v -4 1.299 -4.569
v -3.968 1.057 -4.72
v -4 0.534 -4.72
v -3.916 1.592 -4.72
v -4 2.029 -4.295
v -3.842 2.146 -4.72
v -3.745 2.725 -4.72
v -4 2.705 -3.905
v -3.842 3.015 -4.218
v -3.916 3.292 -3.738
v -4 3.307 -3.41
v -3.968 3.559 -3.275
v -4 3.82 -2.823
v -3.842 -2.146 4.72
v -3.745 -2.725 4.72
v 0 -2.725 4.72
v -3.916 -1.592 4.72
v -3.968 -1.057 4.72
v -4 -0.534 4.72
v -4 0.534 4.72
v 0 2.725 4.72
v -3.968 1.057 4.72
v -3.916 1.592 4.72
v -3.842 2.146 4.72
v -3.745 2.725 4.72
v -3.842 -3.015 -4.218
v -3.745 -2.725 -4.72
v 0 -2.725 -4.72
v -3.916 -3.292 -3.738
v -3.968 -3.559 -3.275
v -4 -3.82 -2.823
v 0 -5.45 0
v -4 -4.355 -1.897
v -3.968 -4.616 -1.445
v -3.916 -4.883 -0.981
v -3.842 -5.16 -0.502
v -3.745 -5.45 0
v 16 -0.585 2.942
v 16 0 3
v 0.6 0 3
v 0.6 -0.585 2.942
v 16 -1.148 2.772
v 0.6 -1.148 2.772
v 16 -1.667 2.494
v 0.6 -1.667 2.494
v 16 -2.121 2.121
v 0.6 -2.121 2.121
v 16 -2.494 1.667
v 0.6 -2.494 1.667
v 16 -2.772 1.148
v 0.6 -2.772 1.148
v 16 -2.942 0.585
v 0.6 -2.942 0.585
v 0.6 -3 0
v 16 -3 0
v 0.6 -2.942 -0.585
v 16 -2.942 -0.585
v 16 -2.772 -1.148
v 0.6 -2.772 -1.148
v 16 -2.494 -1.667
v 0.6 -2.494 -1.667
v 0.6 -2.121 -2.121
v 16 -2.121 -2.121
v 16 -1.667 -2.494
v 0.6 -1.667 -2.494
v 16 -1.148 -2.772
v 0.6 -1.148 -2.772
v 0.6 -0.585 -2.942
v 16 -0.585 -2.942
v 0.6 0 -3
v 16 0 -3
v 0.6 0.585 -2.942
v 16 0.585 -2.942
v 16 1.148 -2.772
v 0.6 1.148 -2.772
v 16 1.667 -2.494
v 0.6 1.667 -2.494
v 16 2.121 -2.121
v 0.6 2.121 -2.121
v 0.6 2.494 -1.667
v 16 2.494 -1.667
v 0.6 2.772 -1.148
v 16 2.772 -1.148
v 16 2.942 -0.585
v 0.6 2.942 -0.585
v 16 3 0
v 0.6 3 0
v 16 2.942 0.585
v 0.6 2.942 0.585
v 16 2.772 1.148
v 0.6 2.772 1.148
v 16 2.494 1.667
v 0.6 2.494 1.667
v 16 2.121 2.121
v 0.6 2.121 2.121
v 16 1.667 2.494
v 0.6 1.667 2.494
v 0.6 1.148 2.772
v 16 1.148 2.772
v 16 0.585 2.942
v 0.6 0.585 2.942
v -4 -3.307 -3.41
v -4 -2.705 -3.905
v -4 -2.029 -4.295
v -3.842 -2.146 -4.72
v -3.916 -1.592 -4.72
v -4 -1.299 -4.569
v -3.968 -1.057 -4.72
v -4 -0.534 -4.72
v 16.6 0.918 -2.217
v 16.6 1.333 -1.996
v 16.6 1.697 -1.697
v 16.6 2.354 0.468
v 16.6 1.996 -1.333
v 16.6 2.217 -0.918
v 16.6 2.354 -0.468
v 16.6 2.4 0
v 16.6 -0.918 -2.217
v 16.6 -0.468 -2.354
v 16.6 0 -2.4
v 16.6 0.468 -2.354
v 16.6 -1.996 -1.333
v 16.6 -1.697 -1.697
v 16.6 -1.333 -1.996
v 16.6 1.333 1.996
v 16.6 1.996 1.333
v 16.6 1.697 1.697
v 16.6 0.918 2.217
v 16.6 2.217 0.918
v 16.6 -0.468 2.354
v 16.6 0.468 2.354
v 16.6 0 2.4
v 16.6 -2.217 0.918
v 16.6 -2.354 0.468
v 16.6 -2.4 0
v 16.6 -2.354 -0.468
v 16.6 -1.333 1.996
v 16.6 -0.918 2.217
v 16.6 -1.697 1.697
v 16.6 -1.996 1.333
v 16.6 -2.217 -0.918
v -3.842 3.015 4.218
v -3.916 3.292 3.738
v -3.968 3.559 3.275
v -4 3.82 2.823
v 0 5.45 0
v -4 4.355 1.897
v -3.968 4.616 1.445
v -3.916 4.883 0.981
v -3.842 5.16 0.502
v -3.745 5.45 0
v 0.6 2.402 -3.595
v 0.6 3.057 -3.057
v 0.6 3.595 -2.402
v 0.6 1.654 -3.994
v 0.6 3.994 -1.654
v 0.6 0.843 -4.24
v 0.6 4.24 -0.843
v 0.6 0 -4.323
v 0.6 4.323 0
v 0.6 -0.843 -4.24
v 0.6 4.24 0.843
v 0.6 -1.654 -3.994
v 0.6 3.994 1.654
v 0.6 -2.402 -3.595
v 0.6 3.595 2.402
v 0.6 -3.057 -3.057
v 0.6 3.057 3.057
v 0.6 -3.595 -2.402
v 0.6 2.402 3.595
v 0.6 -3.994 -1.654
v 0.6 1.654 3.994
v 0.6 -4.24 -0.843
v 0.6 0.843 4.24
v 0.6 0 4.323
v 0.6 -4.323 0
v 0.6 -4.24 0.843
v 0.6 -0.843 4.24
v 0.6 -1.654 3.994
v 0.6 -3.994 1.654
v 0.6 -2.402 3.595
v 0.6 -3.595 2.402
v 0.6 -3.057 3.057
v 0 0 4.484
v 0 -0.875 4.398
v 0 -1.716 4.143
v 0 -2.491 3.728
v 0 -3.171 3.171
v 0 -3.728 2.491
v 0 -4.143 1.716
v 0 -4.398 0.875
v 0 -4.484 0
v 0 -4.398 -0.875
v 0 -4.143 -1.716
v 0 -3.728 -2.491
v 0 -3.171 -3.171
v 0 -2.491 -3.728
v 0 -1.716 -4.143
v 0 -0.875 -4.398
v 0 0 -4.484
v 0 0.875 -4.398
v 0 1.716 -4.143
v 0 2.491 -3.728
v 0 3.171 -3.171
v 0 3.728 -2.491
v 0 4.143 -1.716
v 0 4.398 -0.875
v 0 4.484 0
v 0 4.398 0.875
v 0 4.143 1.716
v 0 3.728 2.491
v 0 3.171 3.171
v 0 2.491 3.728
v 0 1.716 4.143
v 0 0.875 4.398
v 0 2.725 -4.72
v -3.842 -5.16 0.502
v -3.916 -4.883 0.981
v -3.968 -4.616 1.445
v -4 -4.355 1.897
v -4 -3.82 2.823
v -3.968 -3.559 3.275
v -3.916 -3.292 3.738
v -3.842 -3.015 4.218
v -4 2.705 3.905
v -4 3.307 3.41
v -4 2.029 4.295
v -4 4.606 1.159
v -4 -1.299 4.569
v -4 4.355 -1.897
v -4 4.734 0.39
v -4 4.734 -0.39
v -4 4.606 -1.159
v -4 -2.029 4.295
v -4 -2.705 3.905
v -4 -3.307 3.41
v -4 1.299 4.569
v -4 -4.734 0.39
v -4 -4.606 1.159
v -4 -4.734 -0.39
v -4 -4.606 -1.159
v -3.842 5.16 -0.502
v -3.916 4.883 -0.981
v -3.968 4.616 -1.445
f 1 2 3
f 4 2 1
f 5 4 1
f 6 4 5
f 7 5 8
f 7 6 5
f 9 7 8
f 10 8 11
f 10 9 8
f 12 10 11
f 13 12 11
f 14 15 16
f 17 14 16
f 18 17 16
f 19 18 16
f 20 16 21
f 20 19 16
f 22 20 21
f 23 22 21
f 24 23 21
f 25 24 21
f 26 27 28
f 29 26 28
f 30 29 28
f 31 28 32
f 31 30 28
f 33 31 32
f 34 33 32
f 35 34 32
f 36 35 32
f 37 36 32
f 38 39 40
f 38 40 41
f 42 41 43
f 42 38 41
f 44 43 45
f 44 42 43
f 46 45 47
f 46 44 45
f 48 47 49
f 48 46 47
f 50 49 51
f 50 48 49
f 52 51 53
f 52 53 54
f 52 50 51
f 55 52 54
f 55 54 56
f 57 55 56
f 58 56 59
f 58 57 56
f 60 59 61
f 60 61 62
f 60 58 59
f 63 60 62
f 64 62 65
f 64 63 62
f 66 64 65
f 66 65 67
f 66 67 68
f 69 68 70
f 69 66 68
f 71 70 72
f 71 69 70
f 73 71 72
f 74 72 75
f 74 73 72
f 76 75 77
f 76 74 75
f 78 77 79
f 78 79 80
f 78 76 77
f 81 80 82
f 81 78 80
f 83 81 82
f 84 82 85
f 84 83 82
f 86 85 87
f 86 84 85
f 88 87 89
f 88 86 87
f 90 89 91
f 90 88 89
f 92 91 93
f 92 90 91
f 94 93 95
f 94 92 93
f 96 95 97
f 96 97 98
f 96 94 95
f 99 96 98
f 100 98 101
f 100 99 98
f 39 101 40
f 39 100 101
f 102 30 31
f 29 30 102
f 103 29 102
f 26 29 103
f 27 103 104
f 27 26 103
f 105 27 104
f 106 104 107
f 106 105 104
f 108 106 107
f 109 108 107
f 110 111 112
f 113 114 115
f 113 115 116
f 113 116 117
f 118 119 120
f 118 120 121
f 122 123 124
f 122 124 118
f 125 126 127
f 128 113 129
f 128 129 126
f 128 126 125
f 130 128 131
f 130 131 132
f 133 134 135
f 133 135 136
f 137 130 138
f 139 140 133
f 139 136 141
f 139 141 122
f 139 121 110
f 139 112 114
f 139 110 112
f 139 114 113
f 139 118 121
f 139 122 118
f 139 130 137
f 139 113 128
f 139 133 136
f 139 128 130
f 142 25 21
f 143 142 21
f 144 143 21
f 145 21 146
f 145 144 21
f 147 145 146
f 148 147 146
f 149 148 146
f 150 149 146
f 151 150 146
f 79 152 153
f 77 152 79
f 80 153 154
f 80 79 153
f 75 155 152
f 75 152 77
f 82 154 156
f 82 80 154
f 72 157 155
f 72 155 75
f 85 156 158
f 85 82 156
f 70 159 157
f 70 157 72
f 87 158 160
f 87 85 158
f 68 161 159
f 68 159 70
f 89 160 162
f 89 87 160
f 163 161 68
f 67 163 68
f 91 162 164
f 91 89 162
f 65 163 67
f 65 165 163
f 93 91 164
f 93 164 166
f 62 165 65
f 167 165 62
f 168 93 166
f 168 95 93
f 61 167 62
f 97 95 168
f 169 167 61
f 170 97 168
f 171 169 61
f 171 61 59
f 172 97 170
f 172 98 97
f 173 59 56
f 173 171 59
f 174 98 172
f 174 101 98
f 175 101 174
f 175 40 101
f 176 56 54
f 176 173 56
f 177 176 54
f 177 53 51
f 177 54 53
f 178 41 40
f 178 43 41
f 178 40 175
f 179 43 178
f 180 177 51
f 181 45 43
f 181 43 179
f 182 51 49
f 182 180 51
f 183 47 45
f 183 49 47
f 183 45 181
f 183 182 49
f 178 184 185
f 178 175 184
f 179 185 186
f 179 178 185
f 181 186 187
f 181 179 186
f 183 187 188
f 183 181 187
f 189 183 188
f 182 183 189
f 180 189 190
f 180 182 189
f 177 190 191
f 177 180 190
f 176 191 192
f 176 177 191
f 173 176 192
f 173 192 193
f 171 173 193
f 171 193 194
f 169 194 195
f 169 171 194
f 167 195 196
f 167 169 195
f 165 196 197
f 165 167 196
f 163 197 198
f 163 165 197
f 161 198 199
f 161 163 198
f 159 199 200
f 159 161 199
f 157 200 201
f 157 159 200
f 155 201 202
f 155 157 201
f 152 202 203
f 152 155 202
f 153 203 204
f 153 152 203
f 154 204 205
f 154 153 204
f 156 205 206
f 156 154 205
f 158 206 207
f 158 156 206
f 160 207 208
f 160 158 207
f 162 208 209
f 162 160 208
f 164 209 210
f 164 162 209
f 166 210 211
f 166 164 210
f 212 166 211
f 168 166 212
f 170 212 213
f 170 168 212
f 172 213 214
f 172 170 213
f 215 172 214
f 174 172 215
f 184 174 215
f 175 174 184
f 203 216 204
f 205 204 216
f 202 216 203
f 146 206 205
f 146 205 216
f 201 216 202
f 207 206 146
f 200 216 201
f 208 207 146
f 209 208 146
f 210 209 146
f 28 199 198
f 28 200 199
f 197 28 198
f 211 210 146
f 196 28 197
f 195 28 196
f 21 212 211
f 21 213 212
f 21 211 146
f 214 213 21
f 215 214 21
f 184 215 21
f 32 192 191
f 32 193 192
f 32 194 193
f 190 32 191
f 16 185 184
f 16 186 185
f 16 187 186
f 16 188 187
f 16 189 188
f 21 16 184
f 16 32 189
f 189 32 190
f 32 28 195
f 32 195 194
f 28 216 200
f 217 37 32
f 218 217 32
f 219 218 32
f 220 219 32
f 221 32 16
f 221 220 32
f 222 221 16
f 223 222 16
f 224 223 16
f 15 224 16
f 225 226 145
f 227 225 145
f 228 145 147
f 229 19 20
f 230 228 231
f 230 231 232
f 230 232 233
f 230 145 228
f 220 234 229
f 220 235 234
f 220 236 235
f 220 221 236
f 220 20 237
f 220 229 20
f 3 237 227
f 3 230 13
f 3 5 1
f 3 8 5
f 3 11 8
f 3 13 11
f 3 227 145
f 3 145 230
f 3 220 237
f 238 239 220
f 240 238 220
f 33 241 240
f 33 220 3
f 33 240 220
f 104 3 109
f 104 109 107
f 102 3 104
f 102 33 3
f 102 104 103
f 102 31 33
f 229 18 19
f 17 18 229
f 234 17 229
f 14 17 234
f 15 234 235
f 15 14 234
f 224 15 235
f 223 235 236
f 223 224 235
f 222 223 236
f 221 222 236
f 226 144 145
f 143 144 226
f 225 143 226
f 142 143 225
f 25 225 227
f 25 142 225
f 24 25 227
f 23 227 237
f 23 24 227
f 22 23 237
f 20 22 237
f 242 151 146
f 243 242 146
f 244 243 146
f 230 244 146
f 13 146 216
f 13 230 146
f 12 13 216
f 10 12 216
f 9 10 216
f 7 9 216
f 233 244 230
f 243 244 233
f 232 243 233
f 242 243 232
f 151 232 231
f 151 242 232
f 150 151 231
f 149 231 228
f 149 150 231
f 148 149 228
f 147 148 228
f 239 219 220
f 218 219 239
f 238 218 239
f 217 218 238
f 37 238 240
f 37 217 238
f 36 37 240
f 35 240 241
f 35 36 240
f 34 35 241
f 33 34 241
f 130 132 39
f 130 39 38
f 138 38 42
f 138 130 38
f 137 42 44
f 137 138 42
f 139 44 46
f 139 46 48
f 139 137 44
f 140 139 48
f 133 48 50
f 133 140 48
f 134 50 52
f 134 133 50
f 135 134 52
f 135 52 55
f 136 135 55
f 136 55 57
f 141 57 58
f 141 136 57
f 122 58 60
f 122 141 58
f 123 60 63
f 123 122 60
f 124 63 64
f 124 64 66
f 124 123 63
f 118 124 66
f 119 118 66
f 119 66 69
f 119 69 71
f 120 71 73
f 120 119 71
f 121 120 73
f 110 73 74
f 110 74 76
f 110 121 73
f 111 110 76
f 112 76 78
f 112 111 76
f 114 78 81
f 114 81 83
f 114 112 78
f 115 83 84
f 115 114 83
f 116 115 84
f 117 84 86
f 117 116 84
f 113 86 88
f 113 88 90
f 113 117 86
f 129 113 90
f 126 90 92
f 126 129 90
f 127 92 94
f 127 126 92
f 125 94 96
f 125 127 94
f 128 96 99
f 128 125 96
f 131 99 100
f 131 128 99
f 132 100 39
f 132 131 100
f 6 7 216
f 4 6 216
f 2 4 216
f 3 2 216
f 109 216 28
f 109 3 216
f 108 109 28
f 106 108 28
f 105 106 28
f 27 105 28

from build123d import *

# Parameters (mm, degrees)
SKETCH_2_OUTSIDE_W  = 18.046
SKETCH_2_OUTSIDE_H  = 18.046
CUT_EXTRUDE_1_DEPTH = 22.994658442
CHAMFER_1_SIZE      = 0.6


with BuildPart() as part:
    # Эскиз1 → Повернуть1 (revolve)
    with BuildSketch(Plane.XY, mode=Mode.PRIVATE) as revolve_1_sk:
        Polygon((-4, 0), (-4, 5.45), (0, 5.45), (0, 4.483974596), (0.6, 4.323205081), (0.6, 3), (16.6, 3), (16.6, 0), align=None)
    revolve(revolve_1_sk.sketch.rotate(Axis((-1000, 0, 0), (1, 0, 0)), 90), axis=Axis((-1000, 0, 0), (1, 0, 0)))

    # Эскиз2 outside → Вырез-Вытянуть1 (cut, through all)
    with BuildSketch(Plane.ZY.offset(4)):
        Rectangle(SKETCH_2_OUTSIDE_W, SKETCH_2_OUTSIDE_H)
        Polygon((0, -5.45), (4.719838451, -2.725), (4.719838451, 2.725), (0, 5.45), (-4.719838451, 2.725), (-4.719838451, -2.725), align=None, mode=Mode.SUBTRACT)
    extrude(amount=-CUT_EXTRUDE_1_DEPTH, mode=Mode.SUBTRACT)

    # Эскиз4 → Вырез-Повернуть1 (revolve, cut)
    with BuildSketch(Plane.XY):
        Polygon((-4, 4.75), (-3.745220836, 5.45), (-4, 5.45), align=None)
    revolve(axis=Axis((-1000, 0, 0), (1, 0, 0)), mode=Mode.SUBTRACT)

    # Фаска1
    chamfer_1_edges = [part.edges().sort_by_distance(p)[0] for p in [
        (16.6, 0, -3),
    ]]
    chamfer(chamfer_1_edges, length=CHAMFER_1_SIZE)


solid = part.part
